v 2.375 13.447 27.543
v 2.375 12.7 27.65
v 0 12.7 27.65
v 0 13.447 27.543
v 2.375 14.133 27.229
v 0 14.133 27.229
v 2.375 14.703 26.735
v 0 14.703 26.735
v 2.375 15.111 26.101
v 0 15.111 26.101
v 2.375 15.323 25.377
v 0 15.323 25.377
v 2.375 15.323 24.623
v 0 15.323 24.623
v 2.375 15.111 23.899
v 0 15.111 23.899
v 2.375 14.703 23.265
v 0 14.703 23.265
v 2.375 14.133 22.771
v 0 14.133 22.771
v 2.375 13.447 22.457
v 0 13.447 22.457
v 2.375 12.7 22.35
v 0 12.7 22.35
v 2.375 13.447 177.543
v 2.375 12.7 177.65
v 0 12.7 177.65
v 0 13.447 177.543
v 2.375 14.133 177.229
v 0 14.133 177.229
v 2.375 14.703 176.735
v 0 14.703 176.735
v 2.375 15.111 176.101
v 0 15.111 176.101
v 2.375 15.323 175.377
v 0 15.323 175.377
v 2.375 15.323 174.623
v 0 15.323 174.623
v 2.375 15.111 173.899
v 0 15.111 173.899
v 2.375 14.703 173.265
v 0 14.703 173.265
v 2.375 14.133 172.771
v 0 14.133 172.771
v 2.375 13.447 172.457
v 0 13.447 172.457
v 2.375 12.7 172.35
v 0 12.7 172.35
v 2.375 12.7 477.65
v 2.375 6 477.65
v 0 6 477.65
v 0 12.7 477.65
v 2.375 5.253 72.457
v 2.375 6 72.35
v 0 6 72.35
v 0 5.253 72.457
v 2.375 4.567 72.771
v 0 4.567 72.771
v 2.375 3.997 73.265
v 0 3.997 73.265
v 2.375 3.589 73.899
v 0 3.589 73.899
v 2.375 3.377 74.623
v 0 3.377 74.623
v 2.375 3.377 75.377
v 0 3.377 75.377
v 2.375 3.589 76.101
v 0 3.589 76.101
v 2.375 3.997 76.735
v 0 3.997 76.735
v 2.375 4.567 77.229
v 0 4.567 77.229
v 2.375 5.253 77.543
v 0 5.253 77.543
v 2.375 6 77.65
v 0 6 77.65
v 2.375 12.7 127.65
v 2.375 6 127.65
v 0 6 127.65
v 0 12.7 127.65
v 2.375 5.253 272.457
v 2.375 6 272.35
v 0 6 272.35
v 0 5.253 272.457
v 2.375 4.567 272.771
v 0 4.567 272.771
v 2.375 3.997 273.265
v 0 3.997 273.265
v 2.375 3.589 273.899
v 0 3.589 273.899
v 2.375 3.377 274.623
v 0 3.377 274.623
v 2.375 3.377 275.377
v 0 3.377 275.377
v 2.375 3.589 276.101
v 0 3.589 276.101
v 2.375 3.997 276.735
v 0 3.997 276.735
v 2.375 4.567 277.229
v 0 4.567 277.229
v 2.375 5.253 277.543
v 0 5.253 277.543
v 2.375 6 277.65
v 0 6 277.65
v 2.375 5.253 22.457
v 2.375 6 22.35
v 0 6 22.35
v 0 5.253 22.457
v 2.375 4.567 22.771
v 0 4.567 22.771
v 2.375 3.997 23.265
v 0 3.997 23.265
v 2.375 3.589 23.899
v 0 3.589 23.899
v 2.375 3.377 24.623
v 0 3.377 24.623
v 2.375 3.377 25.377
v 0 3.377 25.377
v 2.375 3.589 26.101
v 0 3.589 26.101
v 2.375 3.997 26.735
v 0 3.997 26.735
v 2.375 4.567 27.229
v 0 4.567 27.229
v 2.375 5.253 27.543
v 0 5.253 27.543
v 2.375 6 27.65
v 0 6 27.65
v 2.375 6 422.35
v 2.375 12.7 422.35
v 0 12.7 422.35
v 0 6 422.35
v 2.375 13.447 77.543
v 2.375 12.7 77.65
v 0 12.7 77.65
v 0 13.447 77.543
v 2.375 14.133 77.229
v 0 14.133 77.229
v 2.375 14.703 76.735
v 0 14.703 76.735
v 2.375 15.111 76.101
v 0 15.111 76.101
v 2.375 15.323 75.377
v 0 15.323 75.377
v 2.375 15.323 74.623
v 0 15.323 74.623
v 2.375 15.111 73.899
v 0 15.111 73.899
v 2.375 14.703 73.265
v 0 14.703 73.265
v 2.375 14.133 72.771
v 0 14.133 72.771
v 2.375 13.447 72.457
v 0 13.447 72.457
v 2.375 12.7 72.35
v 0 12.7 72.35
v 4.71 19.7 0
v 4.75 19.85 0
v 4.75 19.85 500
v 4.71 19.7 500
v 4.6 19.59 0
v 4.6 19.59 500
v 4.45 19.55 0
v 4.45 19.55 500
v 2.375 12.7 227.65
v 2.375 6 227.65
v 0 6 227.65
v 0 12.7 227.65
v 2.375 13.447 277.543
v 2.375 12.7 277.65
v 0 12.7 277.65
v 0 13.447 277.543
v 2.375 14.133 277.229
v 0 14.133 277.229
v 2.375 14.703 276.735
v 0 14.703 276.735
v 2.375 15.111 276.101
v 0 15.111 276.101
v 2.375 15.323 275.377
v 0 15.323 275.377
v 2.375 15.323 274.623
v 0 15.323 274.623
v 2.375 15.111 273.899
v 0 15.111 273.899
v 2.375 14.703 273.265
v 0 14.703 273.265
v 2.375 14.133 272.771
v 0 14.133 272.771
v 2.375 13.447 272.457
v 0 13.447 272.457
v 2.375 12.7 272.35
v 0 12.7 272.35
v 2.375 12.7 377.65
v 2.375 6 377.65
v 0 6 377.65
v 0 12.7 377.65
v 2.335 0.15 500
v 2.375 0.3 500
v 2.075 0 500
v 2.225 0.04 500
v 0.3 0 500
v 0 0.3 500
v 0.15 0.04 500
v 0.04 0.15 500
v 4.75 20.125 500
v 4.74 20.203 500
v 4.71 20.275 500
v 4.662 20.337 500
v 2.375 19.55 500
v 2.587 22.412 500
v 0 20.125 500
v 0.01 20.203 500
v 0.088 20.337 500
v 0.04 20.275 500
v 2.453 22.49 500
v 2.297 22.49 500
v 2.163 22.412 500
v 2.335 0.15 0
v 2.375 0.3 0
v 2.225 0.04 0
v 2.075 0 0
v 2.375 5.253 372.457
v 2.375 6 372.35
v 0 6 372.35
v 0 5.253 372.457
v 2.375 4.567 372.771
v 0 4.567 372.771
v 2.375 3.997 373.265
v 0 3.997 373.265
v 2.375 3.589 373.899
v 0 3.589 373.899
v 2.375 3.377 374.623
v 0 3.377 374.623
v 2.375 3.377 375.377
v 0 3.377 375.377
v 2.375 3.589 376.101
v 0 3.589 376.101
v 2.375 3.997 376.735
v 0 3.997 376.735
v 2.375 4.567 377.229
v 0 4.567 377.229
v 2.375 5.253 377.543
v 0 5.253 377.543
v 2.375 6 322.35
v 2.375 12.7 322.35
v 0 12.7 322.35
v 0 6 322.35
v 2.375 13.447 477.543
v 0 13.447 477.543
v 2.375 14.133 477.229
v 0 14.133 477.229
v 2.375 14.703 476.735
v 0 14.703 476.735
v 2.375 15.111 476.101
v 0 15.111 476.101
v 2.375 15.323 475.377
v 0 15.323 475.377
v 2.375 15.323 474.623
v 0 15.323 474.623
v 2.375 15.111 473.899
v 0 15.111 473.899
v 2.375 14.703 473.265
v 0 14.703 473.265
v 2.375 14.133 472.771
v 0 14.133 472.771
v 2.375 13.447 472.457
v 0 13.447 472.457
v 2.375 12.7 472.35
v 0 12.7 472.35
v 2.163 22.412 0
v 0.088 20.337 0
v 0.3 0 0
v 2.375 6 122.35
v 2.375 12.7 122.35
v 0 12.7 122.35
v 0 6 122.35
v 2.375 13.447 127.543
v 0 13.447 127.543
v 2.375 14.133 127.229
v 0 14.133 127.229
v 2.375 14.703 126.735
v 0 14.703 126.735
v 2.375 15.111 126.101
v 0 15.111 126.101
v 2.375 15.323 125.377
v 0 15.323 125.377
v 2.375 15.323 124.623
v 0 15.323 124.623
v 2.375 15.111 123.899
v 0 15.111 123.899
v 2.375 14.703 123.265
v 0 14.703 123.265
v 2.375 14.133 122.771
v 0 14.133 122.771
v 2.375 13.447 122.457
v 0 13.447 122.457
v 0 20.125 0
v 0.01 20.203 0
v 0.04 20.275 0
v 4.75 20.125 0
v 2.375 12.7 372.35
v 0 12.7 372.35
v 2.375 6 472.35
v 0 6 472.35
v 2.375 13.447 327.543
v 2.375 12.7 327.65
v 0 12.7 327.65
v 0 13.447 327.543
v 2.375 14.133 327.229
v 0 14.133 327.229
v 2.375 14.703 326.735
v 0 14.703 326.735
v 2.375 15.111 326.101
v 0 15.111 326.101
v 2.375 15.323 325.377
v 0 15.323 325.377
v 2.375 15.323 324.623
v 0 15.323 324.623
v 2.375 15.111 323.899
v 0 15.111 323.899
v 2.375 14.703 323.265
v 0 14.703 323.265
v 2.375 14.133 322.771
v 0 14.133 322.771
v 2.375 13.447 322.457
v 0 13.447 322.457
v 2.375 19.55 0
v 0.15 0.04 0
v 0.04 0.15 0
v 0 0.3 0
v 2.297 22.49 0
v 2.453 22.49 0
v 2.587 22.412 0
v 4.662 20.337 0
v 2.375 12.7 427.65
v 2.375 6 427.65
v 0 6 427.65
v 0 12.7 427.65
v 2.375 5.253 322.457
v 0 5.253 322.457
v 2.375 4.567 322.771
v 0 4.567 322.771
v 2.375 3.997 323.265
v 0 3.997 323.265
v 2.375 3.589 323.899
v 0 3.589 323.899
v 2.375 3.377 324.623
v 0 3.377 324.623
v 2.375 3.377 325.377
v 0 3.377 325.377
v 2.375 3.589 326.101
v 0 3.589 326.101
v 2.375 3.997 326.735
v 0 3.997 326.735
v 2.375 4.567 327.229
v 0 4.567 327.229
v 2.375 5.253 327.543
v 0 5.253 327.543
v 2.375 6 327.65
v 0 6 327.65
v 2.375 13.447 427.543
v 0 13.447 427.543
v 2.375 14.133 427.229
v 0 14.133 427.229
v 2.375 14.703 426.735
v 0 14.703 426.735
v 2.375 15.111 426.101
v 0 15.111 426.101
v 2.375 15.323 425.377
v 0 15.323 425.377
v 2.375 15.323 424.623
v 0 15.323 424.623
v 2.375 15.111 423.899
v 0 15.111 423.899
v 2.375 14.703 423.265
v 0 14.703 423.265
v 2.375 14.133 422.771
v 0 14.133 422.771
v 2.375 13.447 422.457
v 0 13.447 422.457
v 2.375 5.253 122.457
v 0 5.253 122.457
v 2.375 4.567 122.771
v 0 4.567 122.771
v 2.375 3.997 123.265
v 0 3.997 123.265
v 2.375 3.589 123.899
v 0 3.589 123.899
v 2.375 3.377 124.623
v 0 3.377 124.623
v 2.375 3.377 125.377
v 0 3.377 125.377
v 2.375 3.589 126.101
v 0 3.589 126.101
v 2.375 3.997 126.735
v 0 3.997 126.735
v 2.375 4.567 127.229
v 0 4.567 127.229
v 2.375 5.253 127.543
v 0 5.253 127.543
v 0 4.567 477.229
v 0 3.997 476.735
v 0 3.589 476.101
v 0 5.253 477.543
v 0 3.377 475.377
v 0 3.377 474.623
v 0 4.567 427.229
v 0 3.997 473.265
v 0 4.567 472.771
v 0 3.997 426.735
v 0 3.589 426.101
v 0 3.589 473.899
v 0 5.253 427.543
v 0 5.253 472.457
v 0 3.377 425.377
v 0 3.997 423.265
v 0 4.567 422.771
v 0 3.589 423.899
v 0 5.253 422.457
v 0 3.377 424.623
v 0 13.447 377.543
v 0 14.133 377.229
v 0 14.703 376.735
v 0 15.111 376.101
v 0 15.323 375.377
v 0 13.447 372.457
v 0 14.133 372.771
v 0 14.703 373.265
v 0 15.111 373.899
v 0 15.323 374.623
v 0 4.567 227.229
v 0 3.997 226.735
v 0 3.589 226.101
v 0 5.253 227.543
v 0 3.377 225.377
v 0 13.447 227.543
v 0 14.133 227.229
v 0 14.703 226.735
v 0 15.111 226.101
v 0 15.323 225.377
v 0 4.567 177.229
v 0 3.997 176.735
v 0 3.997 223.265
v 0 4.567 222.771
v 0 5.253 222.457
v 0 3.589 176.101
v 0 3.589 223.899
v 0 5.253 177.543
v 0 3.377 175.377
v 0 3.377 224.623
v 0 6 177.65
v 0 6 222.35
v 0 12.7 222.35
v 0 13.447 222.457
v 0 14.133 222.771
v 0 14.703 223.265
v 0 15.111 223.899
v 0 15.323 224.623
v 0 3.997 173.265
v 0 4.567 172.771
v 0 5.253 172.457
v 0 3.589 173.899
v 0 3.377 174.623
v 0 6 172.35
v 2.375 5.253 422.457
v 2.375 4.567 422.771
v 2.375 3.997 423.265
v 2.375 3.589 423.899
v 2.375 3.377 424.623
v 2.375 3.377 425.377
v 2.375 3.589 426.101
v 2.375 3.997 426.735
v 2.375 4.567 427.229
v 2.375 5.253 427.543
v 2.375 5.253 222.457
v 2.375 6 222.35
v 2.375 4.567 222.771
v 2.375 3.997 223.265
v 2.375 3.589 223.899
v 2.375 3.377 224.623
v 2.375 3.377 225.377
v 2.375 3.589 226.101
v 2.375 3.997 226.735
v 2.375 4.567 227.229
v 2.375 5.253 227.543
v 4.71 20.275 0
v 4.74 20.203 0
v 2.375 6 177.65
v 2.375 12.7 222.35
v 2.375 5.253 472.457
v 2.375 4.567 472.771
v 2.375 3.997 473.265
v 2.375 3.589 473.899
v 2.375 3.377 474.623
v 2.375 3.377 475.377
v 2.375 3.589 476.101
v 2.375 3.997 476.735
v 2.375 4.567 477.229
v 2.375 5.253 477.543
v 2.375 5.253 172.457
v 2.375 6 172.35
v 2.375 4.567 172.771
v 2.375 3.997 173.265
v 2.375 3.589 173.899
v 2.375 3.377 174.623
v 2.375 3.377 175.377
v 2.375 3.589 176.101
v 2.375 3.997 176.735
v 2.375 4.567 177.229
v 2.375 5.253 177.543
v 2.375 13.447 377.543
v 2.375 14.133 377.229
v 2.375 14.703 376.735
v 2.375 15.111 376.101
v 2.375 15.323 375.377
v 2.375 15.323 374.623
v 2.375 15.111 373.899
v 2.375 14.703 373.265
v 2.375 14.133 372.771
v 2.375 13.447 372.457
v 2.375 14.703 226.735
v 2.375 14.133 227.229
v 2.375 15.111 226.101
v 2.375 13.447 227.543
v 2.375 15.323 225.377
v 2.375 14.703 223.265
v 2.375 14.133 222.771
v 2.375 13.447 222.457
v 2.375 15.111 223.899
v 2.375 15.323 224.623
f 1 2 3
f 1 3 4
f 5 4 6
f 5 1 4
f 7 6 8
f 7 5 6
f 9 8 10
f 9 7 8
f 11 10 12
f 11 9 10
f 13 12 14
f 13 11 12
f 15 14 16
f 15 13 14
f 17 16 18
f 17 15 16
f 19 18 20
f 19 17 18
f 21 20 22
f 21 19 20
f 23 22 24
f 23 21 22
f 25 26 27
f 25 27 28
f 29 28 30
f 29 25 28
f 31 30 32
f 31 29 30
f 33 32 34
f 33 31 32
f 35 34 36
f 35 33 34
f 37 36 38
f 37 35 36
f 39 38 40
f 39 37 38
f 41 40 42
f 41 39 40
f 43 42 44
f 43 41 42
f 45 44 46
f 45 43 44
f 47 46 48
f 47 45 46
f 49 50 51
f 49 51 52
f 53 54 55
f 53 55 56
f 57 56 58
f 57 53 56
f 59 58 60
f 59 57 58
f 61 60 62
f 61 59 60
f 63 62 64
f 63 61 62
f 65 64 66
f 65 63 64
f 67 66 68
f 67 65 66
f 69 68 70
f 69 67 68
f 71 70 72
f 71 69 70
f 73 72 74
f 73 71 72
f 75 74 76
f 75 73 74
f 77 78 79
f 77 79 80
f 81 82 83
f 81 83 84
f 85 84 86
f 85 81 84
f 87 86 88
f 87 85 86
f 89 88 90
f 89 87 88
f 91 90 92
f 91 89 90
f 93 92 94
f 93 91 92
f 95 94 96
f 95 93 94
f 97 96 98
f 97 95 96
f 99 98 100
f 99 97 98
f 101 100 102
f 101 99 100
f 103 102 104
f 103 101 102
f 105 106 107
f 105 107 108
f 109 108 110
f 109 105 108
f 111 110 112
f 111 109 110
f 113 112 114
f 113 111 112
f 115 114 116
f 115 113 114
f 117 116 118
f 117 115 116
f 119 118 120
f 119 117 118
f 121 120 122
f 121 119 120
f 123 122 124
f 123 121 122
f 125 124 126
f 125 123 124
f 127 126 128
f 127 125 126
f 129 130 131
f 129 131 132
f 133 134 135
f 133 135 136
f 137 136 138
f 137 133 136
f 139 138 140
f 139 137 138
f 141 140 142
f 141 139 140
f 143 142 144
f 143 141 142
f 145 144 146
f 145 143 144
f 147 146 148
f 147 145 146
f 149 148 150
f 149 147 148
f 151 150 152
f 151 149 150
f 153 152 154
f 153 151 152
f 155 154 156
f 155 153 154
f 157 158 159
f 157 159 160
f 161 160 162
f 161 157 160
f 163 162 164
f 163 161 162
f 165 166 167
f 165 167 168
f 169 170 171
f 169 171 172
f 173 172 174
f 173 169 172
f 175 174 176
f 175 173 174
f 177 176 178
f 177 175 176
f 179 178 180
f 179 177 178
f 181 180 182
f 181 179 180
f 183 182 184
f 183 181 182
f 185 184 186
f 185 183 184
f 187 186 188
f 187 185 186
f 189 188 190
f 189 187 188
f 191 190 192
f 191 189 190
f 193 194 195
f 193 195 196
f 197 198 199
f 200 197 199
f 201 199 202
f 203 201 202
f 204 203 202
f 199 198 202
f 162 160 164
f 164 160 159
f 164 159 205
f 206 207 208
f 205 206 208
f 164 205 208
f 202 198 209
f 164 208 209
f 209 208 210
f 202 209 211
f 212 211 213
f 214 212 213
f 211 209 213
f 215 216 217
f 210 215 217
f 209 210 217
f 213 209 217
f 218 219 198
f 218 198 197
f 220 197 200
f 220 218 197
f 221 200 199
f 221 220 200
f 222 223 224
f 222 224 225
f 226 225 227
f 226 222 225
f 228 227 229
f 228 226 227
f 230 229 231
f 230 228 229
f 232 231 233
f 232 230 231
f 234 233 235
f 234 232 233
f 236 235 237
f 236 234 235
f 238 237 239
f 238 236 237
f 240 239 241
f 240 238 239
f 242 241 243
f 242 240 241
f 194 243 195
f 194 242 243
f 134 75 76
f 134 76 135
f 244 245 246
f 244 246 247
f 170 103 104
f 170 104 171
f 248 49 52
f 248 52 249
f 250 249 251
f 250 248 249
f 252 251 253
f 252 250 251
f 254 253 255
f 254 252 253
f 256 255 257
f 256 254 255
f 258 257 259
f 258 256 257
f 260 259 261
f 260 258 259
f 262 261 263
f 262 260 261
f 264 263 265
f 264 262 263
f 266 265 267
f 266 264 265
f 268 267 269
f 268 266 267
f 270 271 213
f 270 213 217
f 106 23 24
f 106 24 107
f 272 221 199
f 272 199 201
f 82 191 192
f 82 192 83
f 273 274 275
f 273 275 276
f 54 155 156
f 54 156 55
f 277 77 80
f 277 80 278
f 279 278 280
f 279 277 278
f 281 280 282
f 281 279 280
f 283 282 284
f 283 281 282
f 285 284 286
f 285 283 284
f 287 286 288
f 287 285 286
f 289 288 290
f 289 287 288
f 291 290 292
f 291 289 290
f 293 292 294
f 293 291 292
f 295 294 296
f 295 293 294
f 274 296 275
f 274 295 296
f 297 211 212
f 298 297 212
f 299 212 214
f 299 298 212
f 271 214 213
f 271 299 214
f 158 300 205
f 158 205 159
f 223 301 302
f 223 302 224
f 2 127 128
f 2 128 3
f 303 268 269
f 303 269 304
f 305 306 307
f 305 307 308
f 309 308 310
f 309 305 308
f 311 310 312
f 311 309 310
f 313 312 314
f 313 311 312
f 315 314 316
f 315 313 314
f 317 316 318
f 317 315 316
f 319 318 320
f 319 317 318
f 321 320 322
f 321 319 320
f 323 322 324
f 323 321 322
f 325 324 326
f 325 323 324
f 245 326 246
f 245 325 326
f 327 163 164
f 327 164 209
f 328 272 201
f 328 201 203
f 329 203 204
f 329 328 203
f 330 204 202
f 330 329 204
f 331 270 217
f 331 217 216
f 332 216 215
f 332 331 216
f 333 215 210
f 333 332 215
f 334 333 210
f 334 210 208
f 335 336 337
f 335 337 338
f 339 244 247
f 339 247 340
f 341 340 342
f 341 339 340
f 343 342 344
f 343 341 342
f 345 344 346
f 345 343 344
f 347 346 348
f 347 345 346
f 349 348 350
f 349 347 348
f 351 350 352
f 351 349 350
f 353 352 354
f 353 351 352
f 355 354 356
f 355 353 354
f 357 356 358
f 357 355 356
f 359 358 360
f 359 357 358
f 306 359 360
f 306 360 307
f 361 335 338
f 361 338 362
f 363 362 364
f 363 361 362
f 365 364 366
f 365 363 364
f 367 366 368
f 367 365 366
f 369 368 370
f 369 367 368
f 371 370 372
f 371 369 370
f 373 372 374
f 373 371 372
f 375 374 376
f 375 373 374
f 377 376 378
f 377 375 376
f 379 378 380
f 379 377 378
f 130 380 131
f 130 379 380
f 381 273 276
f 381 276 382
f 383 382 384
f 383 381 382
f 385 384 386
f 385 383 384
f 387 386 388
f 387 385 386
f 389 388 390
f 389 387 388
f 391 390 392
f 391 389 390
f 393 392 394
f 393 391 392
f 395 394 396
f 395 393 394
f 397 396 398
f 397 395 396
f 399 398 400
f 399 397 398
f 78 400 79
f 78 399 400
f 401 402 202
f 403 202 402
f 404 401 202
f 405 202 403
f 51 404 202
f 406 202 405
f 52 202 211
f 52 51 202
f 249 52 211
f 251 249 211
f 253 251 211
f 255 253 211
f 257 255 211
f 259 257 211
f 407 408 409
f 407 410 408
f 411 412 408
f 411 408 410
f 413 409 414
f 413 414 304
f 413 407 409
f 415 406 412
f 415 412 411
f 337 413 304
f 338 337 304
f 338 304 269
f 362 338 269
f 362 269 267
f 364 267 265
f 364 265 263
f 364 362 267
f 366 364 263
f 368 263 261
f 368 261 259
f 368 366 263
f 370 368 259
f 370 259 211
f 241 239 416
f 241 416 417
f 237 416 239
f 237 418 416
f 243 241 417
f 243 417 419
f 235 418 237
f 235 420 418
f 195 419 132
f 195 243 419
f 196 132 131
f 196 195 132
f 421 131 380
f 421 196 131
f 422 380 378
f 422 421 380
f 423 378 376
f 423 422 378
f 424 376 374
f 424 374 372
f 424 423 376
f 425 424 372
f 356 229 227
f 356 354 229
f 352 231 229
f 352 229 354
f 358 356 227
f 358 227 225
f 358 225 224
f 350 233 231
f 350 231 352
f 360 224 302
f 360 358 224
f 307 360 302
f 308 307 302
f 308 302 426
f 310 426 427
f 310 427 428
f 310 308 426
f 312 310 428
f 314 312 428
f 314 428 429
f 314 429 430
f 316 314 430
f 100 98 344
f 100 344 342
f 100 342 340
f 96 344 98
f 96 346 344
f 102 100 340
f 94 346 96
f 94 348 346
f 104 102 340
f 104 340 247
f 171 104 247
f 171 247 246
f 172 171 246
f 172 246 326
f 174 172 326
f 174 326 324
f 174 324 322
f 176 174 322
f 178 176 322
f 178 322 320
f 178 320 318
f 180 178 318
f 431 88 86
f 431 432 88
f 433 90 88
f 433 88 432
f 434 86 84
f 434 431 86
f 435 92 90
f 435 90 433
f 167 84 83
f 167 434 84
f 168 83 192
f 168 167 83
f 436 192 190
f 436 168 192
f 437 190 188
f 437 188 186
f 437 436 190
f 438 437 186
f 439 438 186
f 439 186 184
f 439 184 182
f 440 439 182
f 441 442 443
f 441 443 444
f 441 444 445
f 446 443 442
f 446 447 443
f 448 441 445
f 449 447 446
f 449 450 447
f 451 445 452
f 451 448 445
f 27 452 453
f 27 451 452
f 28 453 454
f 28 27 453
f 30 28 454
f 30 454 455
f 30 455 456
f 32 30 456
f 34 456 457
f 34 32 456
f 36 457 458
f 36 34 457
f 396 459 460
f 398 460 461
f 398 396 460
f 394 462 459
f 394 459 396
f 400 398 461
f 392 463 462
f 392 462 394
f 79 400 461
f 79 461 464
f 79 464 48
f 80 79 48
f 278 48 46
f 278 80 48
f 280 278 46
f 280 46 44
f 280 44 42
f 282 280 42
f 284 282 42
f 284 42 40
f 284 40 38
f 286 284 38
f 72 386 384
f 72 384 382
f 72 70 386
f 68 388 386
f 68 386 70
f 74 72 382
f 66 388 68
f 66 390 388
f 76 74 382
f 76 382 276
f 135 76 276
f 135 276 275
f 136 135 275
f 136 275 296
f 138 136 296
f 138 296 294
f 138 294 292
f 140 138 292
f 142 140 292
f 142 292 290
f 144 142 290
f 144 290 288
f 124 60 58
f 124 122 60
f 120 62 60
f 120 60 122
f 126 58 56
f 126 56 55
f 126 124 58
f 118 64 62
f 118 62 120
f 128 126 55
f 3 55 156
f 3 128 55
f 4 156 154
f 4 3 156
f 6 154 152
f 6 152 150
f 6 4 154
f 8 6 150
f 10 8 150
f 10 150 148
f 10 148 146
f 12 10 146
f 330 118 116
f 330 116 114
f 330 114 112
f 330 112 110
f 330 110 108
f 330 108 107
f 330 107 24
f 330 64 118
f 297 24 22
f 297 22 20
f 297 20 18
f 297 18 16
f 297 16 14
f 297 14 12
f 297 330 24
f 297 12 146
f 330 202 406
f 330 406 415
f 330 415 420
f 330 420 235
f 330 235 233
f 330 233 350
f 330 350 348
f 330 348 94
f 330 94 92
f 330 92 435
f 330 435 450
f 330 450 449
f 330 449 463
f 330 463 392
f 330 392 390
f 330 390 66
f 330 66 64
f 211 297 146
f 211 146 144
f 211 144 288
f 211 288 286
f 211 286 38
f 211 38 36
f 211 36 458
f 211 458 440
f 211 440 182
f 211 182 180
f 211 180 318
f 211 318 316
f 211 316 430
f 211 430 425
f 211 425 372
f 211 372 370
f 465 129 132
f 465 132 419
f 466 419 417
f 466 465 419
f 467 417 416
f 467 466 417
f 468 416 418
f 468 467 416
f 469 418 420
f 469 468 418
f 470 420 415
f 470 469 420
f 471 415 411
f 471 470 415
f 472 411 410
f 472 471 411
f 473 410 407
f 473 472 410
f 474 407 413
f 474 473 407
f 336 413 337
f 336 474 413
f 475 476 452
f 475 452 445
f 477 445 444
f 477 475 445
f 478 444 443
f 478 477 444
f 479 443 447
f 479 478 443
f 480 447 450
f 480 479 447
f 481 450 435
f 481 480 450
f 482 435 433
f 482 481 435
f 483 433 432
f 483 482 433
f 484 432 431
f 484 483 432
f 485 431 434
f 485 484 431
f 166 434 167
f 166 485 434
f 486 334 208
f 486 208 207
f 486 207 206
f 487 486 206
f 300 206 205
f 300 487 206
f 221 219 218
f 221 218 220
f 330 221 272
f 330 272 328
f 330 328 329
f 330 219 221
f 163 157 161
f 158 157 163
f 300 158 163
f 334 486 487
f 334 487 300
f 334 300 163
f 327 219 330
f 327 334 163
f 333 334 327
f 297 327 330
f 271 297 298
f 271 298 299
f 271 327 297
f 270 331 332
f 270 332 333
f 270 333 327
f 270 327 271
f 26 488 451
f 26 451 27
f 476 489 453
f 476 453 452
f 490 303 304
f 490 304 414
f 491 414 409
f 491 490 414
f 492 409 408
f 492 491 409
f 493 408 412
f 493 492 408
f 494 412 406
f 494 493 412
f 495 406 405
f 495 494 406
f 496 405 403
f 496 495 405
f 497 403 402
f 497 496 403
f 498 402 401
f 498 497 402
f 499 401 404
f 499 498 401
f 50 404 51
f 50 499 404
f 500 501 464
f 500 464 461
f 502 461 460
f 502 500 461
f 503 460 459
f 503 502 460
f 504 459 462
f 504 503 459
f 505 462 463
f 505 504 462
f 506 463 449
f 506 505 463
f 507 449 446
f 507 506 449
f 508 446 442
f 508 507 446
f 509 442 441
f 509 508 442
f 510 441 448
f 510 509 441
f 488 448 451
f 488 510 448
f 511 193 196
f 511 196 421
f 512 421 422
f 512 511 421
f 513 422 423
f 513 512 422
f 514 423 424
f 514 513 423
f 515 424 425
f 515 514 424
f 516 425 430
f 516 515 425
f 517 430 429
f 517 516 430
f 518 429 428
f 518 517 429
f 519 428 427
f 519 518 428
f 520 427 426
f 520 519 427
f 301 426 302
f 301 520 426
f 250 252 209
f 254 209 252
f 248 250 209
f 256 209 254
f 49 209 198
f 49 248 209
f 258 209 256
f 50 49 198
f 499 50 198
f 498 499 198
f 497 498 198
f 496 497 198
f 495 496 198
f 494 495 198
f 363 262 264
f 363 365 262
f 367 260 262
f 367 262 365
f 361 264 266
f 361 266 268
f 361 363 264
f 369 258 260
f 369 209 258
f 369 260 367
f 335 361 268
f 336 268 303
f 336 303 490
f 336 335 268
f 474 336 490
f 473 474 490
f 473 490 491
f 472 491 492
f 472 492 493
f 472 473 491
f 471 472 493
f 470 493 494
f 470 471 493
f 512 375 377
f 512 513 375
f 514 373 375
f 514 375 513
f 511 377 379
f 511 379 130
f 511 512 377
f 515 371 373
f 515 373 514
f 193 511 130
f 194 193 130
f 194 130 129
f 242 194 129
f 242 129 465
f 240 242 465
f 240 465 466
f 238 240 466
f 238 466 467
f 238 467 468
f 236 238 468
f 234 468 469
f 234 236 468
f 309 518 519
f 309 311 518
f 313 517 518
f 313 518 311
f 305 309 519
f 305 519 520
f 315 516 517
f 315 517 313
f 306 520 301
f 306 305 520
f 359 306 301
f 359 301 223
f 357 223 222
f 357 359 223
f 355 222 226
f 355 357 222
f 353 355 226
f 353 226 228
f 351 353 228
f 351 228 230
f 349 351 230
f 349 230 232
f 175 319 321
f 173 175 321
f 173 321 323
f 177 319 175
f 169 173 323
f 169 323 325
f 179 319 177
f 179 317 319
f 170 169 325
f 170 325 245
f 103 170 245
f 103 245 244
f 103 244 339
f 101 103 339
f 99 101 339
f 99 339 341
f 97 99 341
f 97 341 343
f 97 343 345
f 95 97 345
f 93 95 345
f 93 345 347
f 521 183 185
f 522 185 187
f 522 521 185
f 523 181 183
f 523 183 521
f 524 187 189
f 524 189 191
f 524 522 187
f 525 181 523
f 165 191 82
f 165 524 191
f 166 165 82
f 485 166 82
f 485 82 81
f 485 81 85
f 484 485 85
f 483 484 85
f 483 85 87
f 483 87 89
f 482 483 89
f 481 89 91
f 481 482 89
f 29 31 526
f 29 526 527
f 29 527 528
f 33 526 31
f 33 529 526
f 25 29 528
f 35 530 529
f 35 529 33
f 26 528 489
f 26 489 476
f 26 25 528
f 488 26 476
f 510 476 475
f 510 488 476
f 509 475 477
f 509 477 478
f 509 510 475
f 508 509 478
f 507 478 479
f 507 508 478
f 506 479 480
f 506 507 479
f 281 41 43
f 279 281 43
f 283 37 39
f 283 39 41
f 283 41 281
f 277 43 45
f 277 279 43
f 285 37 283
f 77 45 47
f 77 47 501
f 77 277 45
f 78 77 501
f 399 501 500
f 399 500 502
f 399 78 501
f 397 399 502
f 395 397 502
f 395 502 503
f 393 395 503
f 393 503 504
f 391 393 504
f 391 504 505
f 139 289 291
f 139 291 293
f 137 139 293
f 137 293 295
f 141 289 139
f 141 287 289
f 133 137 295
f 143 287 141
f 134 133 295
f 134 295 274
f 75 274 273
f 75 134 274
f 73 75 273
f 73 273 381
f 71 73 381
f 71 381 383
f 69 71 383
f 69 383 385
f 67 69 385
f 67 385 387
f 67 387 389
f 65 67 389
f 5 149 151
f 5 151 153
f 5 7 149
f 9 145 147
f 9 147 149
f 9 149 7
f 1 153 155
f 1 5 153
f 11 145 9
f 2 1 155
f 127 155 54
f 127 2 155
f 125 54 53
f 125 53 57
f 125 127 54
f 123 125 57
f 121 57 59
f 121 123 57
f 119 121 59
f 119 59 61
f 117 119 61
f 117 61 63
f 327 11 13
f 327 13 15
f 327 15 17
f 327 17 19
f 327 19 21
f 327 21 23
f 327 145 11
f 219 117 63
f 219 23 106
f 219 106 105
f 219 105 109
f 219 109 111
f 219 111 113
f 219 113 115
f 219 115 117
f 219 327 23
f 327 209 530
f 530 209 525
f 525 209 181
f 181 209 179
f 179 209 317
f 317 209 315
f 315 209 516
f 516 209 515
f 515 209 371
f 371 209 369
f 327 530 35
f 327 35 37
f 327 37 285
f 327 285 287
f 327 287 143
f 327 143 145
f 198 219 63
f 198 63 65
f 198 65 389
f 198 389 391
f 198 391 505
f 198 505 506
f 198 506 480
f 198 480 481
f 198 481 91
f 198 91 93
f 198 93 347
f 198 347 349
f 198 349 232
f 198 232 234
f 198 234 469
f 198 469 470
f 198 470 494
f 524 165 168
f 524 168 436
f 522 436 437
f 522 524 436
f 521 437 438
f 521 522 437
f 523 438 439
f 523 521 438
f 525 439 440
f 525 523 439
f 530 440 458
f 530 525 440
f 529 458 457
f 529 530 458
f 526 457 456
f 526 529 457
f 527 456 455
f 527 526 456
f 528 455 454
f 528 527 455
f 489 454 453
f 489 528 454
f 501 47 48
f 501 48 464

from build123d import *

# Parameters (mm, degrees)
BOSS_EXTRUDE1_DEPTH = 500
CUT_EXTRUDE1_DEPTH  = 3.375
LPATTERN1_COUNT     = 10
LPATTERN1_PITCH     = 50


with BuildPart() as part:
    # Sketch1 → Boss-Extrude1 (new body)
    with BuildSketch(Plane.XY):
        with BuildLine():
            Line((0, 0.3), (0, 20.125))
            ThreePointArc((0, 20.125), (0.02283614, 20.23980503), (0.087867966, 20.337132034))
            Line((0.087867966, 20.337132034), (2.162867966, 22.412132034))
            ThreePointArc((2.162867966, 22.412132034), (2.375, 22.5), (2.587132034, 22.412132034))
            Line((2.587132034, 22.412132034), (4.662132034, 20.337132034))
            ThreePointArc((4.662132034, 20.337132034), (4.72716386, 20.23980503), (4.75, 20.125))
            Line((4.75, 20.125), (4.75, 19.85))
            ThreePointArc((4.75, 19.85), (4.662132034, 19.637867966), (4.45, 19.55))
            Line((4.45, 19.55), (2.375, 19.55))
            Line((2.375, 19.55), (2.375, 0.3))
            ThreePointArc((2.375, 0.3), (2.287132034, 0.087867966), (2.075, 0))
            Line((2.075, 0), (0.3, 0))
            ThreePointArc((0.3, 0), (0.087867966, 0.087867966), (0, 0.3))
        make_face()
    extrude(amount=BOSS_EXTRUDE1_DEPTH)

    # Sketch2 → Cut-Extrude1 (cut, through all)
    with BuildSketch(Plane(origin=(2.375, 0, 0), x_dir=(0, 0, -1), z_dir=(1, 0, 0))):
        with BuildLine():
            Line((-22.35, 12.7), (-22.35, 6))
            ThreePointArc((-22.35, 6), (-25, 3.35), (-27.65, 6))
            Line((-27.65, 6), (-27.65, 12.7))
            ThreePointArc((-27.65, 12.7), (-25, 15.35), (-22.35, 12.7))
        make_face()
    cut_extrude1 = extrude(amount=-CUT_EXTRUDE1_DEPTH, mode=Mode.SUBTRACT)

    # LPattern1: Cut-Extrude1 ×10
    with Locations(*[(0, 0, i * LPATTERN1_PITCH) for i in range(1, LPATTERN1_COUNT)]):
        add(cut_extrude1, mode=Mode.SUBTRACT)


solid = part.part
